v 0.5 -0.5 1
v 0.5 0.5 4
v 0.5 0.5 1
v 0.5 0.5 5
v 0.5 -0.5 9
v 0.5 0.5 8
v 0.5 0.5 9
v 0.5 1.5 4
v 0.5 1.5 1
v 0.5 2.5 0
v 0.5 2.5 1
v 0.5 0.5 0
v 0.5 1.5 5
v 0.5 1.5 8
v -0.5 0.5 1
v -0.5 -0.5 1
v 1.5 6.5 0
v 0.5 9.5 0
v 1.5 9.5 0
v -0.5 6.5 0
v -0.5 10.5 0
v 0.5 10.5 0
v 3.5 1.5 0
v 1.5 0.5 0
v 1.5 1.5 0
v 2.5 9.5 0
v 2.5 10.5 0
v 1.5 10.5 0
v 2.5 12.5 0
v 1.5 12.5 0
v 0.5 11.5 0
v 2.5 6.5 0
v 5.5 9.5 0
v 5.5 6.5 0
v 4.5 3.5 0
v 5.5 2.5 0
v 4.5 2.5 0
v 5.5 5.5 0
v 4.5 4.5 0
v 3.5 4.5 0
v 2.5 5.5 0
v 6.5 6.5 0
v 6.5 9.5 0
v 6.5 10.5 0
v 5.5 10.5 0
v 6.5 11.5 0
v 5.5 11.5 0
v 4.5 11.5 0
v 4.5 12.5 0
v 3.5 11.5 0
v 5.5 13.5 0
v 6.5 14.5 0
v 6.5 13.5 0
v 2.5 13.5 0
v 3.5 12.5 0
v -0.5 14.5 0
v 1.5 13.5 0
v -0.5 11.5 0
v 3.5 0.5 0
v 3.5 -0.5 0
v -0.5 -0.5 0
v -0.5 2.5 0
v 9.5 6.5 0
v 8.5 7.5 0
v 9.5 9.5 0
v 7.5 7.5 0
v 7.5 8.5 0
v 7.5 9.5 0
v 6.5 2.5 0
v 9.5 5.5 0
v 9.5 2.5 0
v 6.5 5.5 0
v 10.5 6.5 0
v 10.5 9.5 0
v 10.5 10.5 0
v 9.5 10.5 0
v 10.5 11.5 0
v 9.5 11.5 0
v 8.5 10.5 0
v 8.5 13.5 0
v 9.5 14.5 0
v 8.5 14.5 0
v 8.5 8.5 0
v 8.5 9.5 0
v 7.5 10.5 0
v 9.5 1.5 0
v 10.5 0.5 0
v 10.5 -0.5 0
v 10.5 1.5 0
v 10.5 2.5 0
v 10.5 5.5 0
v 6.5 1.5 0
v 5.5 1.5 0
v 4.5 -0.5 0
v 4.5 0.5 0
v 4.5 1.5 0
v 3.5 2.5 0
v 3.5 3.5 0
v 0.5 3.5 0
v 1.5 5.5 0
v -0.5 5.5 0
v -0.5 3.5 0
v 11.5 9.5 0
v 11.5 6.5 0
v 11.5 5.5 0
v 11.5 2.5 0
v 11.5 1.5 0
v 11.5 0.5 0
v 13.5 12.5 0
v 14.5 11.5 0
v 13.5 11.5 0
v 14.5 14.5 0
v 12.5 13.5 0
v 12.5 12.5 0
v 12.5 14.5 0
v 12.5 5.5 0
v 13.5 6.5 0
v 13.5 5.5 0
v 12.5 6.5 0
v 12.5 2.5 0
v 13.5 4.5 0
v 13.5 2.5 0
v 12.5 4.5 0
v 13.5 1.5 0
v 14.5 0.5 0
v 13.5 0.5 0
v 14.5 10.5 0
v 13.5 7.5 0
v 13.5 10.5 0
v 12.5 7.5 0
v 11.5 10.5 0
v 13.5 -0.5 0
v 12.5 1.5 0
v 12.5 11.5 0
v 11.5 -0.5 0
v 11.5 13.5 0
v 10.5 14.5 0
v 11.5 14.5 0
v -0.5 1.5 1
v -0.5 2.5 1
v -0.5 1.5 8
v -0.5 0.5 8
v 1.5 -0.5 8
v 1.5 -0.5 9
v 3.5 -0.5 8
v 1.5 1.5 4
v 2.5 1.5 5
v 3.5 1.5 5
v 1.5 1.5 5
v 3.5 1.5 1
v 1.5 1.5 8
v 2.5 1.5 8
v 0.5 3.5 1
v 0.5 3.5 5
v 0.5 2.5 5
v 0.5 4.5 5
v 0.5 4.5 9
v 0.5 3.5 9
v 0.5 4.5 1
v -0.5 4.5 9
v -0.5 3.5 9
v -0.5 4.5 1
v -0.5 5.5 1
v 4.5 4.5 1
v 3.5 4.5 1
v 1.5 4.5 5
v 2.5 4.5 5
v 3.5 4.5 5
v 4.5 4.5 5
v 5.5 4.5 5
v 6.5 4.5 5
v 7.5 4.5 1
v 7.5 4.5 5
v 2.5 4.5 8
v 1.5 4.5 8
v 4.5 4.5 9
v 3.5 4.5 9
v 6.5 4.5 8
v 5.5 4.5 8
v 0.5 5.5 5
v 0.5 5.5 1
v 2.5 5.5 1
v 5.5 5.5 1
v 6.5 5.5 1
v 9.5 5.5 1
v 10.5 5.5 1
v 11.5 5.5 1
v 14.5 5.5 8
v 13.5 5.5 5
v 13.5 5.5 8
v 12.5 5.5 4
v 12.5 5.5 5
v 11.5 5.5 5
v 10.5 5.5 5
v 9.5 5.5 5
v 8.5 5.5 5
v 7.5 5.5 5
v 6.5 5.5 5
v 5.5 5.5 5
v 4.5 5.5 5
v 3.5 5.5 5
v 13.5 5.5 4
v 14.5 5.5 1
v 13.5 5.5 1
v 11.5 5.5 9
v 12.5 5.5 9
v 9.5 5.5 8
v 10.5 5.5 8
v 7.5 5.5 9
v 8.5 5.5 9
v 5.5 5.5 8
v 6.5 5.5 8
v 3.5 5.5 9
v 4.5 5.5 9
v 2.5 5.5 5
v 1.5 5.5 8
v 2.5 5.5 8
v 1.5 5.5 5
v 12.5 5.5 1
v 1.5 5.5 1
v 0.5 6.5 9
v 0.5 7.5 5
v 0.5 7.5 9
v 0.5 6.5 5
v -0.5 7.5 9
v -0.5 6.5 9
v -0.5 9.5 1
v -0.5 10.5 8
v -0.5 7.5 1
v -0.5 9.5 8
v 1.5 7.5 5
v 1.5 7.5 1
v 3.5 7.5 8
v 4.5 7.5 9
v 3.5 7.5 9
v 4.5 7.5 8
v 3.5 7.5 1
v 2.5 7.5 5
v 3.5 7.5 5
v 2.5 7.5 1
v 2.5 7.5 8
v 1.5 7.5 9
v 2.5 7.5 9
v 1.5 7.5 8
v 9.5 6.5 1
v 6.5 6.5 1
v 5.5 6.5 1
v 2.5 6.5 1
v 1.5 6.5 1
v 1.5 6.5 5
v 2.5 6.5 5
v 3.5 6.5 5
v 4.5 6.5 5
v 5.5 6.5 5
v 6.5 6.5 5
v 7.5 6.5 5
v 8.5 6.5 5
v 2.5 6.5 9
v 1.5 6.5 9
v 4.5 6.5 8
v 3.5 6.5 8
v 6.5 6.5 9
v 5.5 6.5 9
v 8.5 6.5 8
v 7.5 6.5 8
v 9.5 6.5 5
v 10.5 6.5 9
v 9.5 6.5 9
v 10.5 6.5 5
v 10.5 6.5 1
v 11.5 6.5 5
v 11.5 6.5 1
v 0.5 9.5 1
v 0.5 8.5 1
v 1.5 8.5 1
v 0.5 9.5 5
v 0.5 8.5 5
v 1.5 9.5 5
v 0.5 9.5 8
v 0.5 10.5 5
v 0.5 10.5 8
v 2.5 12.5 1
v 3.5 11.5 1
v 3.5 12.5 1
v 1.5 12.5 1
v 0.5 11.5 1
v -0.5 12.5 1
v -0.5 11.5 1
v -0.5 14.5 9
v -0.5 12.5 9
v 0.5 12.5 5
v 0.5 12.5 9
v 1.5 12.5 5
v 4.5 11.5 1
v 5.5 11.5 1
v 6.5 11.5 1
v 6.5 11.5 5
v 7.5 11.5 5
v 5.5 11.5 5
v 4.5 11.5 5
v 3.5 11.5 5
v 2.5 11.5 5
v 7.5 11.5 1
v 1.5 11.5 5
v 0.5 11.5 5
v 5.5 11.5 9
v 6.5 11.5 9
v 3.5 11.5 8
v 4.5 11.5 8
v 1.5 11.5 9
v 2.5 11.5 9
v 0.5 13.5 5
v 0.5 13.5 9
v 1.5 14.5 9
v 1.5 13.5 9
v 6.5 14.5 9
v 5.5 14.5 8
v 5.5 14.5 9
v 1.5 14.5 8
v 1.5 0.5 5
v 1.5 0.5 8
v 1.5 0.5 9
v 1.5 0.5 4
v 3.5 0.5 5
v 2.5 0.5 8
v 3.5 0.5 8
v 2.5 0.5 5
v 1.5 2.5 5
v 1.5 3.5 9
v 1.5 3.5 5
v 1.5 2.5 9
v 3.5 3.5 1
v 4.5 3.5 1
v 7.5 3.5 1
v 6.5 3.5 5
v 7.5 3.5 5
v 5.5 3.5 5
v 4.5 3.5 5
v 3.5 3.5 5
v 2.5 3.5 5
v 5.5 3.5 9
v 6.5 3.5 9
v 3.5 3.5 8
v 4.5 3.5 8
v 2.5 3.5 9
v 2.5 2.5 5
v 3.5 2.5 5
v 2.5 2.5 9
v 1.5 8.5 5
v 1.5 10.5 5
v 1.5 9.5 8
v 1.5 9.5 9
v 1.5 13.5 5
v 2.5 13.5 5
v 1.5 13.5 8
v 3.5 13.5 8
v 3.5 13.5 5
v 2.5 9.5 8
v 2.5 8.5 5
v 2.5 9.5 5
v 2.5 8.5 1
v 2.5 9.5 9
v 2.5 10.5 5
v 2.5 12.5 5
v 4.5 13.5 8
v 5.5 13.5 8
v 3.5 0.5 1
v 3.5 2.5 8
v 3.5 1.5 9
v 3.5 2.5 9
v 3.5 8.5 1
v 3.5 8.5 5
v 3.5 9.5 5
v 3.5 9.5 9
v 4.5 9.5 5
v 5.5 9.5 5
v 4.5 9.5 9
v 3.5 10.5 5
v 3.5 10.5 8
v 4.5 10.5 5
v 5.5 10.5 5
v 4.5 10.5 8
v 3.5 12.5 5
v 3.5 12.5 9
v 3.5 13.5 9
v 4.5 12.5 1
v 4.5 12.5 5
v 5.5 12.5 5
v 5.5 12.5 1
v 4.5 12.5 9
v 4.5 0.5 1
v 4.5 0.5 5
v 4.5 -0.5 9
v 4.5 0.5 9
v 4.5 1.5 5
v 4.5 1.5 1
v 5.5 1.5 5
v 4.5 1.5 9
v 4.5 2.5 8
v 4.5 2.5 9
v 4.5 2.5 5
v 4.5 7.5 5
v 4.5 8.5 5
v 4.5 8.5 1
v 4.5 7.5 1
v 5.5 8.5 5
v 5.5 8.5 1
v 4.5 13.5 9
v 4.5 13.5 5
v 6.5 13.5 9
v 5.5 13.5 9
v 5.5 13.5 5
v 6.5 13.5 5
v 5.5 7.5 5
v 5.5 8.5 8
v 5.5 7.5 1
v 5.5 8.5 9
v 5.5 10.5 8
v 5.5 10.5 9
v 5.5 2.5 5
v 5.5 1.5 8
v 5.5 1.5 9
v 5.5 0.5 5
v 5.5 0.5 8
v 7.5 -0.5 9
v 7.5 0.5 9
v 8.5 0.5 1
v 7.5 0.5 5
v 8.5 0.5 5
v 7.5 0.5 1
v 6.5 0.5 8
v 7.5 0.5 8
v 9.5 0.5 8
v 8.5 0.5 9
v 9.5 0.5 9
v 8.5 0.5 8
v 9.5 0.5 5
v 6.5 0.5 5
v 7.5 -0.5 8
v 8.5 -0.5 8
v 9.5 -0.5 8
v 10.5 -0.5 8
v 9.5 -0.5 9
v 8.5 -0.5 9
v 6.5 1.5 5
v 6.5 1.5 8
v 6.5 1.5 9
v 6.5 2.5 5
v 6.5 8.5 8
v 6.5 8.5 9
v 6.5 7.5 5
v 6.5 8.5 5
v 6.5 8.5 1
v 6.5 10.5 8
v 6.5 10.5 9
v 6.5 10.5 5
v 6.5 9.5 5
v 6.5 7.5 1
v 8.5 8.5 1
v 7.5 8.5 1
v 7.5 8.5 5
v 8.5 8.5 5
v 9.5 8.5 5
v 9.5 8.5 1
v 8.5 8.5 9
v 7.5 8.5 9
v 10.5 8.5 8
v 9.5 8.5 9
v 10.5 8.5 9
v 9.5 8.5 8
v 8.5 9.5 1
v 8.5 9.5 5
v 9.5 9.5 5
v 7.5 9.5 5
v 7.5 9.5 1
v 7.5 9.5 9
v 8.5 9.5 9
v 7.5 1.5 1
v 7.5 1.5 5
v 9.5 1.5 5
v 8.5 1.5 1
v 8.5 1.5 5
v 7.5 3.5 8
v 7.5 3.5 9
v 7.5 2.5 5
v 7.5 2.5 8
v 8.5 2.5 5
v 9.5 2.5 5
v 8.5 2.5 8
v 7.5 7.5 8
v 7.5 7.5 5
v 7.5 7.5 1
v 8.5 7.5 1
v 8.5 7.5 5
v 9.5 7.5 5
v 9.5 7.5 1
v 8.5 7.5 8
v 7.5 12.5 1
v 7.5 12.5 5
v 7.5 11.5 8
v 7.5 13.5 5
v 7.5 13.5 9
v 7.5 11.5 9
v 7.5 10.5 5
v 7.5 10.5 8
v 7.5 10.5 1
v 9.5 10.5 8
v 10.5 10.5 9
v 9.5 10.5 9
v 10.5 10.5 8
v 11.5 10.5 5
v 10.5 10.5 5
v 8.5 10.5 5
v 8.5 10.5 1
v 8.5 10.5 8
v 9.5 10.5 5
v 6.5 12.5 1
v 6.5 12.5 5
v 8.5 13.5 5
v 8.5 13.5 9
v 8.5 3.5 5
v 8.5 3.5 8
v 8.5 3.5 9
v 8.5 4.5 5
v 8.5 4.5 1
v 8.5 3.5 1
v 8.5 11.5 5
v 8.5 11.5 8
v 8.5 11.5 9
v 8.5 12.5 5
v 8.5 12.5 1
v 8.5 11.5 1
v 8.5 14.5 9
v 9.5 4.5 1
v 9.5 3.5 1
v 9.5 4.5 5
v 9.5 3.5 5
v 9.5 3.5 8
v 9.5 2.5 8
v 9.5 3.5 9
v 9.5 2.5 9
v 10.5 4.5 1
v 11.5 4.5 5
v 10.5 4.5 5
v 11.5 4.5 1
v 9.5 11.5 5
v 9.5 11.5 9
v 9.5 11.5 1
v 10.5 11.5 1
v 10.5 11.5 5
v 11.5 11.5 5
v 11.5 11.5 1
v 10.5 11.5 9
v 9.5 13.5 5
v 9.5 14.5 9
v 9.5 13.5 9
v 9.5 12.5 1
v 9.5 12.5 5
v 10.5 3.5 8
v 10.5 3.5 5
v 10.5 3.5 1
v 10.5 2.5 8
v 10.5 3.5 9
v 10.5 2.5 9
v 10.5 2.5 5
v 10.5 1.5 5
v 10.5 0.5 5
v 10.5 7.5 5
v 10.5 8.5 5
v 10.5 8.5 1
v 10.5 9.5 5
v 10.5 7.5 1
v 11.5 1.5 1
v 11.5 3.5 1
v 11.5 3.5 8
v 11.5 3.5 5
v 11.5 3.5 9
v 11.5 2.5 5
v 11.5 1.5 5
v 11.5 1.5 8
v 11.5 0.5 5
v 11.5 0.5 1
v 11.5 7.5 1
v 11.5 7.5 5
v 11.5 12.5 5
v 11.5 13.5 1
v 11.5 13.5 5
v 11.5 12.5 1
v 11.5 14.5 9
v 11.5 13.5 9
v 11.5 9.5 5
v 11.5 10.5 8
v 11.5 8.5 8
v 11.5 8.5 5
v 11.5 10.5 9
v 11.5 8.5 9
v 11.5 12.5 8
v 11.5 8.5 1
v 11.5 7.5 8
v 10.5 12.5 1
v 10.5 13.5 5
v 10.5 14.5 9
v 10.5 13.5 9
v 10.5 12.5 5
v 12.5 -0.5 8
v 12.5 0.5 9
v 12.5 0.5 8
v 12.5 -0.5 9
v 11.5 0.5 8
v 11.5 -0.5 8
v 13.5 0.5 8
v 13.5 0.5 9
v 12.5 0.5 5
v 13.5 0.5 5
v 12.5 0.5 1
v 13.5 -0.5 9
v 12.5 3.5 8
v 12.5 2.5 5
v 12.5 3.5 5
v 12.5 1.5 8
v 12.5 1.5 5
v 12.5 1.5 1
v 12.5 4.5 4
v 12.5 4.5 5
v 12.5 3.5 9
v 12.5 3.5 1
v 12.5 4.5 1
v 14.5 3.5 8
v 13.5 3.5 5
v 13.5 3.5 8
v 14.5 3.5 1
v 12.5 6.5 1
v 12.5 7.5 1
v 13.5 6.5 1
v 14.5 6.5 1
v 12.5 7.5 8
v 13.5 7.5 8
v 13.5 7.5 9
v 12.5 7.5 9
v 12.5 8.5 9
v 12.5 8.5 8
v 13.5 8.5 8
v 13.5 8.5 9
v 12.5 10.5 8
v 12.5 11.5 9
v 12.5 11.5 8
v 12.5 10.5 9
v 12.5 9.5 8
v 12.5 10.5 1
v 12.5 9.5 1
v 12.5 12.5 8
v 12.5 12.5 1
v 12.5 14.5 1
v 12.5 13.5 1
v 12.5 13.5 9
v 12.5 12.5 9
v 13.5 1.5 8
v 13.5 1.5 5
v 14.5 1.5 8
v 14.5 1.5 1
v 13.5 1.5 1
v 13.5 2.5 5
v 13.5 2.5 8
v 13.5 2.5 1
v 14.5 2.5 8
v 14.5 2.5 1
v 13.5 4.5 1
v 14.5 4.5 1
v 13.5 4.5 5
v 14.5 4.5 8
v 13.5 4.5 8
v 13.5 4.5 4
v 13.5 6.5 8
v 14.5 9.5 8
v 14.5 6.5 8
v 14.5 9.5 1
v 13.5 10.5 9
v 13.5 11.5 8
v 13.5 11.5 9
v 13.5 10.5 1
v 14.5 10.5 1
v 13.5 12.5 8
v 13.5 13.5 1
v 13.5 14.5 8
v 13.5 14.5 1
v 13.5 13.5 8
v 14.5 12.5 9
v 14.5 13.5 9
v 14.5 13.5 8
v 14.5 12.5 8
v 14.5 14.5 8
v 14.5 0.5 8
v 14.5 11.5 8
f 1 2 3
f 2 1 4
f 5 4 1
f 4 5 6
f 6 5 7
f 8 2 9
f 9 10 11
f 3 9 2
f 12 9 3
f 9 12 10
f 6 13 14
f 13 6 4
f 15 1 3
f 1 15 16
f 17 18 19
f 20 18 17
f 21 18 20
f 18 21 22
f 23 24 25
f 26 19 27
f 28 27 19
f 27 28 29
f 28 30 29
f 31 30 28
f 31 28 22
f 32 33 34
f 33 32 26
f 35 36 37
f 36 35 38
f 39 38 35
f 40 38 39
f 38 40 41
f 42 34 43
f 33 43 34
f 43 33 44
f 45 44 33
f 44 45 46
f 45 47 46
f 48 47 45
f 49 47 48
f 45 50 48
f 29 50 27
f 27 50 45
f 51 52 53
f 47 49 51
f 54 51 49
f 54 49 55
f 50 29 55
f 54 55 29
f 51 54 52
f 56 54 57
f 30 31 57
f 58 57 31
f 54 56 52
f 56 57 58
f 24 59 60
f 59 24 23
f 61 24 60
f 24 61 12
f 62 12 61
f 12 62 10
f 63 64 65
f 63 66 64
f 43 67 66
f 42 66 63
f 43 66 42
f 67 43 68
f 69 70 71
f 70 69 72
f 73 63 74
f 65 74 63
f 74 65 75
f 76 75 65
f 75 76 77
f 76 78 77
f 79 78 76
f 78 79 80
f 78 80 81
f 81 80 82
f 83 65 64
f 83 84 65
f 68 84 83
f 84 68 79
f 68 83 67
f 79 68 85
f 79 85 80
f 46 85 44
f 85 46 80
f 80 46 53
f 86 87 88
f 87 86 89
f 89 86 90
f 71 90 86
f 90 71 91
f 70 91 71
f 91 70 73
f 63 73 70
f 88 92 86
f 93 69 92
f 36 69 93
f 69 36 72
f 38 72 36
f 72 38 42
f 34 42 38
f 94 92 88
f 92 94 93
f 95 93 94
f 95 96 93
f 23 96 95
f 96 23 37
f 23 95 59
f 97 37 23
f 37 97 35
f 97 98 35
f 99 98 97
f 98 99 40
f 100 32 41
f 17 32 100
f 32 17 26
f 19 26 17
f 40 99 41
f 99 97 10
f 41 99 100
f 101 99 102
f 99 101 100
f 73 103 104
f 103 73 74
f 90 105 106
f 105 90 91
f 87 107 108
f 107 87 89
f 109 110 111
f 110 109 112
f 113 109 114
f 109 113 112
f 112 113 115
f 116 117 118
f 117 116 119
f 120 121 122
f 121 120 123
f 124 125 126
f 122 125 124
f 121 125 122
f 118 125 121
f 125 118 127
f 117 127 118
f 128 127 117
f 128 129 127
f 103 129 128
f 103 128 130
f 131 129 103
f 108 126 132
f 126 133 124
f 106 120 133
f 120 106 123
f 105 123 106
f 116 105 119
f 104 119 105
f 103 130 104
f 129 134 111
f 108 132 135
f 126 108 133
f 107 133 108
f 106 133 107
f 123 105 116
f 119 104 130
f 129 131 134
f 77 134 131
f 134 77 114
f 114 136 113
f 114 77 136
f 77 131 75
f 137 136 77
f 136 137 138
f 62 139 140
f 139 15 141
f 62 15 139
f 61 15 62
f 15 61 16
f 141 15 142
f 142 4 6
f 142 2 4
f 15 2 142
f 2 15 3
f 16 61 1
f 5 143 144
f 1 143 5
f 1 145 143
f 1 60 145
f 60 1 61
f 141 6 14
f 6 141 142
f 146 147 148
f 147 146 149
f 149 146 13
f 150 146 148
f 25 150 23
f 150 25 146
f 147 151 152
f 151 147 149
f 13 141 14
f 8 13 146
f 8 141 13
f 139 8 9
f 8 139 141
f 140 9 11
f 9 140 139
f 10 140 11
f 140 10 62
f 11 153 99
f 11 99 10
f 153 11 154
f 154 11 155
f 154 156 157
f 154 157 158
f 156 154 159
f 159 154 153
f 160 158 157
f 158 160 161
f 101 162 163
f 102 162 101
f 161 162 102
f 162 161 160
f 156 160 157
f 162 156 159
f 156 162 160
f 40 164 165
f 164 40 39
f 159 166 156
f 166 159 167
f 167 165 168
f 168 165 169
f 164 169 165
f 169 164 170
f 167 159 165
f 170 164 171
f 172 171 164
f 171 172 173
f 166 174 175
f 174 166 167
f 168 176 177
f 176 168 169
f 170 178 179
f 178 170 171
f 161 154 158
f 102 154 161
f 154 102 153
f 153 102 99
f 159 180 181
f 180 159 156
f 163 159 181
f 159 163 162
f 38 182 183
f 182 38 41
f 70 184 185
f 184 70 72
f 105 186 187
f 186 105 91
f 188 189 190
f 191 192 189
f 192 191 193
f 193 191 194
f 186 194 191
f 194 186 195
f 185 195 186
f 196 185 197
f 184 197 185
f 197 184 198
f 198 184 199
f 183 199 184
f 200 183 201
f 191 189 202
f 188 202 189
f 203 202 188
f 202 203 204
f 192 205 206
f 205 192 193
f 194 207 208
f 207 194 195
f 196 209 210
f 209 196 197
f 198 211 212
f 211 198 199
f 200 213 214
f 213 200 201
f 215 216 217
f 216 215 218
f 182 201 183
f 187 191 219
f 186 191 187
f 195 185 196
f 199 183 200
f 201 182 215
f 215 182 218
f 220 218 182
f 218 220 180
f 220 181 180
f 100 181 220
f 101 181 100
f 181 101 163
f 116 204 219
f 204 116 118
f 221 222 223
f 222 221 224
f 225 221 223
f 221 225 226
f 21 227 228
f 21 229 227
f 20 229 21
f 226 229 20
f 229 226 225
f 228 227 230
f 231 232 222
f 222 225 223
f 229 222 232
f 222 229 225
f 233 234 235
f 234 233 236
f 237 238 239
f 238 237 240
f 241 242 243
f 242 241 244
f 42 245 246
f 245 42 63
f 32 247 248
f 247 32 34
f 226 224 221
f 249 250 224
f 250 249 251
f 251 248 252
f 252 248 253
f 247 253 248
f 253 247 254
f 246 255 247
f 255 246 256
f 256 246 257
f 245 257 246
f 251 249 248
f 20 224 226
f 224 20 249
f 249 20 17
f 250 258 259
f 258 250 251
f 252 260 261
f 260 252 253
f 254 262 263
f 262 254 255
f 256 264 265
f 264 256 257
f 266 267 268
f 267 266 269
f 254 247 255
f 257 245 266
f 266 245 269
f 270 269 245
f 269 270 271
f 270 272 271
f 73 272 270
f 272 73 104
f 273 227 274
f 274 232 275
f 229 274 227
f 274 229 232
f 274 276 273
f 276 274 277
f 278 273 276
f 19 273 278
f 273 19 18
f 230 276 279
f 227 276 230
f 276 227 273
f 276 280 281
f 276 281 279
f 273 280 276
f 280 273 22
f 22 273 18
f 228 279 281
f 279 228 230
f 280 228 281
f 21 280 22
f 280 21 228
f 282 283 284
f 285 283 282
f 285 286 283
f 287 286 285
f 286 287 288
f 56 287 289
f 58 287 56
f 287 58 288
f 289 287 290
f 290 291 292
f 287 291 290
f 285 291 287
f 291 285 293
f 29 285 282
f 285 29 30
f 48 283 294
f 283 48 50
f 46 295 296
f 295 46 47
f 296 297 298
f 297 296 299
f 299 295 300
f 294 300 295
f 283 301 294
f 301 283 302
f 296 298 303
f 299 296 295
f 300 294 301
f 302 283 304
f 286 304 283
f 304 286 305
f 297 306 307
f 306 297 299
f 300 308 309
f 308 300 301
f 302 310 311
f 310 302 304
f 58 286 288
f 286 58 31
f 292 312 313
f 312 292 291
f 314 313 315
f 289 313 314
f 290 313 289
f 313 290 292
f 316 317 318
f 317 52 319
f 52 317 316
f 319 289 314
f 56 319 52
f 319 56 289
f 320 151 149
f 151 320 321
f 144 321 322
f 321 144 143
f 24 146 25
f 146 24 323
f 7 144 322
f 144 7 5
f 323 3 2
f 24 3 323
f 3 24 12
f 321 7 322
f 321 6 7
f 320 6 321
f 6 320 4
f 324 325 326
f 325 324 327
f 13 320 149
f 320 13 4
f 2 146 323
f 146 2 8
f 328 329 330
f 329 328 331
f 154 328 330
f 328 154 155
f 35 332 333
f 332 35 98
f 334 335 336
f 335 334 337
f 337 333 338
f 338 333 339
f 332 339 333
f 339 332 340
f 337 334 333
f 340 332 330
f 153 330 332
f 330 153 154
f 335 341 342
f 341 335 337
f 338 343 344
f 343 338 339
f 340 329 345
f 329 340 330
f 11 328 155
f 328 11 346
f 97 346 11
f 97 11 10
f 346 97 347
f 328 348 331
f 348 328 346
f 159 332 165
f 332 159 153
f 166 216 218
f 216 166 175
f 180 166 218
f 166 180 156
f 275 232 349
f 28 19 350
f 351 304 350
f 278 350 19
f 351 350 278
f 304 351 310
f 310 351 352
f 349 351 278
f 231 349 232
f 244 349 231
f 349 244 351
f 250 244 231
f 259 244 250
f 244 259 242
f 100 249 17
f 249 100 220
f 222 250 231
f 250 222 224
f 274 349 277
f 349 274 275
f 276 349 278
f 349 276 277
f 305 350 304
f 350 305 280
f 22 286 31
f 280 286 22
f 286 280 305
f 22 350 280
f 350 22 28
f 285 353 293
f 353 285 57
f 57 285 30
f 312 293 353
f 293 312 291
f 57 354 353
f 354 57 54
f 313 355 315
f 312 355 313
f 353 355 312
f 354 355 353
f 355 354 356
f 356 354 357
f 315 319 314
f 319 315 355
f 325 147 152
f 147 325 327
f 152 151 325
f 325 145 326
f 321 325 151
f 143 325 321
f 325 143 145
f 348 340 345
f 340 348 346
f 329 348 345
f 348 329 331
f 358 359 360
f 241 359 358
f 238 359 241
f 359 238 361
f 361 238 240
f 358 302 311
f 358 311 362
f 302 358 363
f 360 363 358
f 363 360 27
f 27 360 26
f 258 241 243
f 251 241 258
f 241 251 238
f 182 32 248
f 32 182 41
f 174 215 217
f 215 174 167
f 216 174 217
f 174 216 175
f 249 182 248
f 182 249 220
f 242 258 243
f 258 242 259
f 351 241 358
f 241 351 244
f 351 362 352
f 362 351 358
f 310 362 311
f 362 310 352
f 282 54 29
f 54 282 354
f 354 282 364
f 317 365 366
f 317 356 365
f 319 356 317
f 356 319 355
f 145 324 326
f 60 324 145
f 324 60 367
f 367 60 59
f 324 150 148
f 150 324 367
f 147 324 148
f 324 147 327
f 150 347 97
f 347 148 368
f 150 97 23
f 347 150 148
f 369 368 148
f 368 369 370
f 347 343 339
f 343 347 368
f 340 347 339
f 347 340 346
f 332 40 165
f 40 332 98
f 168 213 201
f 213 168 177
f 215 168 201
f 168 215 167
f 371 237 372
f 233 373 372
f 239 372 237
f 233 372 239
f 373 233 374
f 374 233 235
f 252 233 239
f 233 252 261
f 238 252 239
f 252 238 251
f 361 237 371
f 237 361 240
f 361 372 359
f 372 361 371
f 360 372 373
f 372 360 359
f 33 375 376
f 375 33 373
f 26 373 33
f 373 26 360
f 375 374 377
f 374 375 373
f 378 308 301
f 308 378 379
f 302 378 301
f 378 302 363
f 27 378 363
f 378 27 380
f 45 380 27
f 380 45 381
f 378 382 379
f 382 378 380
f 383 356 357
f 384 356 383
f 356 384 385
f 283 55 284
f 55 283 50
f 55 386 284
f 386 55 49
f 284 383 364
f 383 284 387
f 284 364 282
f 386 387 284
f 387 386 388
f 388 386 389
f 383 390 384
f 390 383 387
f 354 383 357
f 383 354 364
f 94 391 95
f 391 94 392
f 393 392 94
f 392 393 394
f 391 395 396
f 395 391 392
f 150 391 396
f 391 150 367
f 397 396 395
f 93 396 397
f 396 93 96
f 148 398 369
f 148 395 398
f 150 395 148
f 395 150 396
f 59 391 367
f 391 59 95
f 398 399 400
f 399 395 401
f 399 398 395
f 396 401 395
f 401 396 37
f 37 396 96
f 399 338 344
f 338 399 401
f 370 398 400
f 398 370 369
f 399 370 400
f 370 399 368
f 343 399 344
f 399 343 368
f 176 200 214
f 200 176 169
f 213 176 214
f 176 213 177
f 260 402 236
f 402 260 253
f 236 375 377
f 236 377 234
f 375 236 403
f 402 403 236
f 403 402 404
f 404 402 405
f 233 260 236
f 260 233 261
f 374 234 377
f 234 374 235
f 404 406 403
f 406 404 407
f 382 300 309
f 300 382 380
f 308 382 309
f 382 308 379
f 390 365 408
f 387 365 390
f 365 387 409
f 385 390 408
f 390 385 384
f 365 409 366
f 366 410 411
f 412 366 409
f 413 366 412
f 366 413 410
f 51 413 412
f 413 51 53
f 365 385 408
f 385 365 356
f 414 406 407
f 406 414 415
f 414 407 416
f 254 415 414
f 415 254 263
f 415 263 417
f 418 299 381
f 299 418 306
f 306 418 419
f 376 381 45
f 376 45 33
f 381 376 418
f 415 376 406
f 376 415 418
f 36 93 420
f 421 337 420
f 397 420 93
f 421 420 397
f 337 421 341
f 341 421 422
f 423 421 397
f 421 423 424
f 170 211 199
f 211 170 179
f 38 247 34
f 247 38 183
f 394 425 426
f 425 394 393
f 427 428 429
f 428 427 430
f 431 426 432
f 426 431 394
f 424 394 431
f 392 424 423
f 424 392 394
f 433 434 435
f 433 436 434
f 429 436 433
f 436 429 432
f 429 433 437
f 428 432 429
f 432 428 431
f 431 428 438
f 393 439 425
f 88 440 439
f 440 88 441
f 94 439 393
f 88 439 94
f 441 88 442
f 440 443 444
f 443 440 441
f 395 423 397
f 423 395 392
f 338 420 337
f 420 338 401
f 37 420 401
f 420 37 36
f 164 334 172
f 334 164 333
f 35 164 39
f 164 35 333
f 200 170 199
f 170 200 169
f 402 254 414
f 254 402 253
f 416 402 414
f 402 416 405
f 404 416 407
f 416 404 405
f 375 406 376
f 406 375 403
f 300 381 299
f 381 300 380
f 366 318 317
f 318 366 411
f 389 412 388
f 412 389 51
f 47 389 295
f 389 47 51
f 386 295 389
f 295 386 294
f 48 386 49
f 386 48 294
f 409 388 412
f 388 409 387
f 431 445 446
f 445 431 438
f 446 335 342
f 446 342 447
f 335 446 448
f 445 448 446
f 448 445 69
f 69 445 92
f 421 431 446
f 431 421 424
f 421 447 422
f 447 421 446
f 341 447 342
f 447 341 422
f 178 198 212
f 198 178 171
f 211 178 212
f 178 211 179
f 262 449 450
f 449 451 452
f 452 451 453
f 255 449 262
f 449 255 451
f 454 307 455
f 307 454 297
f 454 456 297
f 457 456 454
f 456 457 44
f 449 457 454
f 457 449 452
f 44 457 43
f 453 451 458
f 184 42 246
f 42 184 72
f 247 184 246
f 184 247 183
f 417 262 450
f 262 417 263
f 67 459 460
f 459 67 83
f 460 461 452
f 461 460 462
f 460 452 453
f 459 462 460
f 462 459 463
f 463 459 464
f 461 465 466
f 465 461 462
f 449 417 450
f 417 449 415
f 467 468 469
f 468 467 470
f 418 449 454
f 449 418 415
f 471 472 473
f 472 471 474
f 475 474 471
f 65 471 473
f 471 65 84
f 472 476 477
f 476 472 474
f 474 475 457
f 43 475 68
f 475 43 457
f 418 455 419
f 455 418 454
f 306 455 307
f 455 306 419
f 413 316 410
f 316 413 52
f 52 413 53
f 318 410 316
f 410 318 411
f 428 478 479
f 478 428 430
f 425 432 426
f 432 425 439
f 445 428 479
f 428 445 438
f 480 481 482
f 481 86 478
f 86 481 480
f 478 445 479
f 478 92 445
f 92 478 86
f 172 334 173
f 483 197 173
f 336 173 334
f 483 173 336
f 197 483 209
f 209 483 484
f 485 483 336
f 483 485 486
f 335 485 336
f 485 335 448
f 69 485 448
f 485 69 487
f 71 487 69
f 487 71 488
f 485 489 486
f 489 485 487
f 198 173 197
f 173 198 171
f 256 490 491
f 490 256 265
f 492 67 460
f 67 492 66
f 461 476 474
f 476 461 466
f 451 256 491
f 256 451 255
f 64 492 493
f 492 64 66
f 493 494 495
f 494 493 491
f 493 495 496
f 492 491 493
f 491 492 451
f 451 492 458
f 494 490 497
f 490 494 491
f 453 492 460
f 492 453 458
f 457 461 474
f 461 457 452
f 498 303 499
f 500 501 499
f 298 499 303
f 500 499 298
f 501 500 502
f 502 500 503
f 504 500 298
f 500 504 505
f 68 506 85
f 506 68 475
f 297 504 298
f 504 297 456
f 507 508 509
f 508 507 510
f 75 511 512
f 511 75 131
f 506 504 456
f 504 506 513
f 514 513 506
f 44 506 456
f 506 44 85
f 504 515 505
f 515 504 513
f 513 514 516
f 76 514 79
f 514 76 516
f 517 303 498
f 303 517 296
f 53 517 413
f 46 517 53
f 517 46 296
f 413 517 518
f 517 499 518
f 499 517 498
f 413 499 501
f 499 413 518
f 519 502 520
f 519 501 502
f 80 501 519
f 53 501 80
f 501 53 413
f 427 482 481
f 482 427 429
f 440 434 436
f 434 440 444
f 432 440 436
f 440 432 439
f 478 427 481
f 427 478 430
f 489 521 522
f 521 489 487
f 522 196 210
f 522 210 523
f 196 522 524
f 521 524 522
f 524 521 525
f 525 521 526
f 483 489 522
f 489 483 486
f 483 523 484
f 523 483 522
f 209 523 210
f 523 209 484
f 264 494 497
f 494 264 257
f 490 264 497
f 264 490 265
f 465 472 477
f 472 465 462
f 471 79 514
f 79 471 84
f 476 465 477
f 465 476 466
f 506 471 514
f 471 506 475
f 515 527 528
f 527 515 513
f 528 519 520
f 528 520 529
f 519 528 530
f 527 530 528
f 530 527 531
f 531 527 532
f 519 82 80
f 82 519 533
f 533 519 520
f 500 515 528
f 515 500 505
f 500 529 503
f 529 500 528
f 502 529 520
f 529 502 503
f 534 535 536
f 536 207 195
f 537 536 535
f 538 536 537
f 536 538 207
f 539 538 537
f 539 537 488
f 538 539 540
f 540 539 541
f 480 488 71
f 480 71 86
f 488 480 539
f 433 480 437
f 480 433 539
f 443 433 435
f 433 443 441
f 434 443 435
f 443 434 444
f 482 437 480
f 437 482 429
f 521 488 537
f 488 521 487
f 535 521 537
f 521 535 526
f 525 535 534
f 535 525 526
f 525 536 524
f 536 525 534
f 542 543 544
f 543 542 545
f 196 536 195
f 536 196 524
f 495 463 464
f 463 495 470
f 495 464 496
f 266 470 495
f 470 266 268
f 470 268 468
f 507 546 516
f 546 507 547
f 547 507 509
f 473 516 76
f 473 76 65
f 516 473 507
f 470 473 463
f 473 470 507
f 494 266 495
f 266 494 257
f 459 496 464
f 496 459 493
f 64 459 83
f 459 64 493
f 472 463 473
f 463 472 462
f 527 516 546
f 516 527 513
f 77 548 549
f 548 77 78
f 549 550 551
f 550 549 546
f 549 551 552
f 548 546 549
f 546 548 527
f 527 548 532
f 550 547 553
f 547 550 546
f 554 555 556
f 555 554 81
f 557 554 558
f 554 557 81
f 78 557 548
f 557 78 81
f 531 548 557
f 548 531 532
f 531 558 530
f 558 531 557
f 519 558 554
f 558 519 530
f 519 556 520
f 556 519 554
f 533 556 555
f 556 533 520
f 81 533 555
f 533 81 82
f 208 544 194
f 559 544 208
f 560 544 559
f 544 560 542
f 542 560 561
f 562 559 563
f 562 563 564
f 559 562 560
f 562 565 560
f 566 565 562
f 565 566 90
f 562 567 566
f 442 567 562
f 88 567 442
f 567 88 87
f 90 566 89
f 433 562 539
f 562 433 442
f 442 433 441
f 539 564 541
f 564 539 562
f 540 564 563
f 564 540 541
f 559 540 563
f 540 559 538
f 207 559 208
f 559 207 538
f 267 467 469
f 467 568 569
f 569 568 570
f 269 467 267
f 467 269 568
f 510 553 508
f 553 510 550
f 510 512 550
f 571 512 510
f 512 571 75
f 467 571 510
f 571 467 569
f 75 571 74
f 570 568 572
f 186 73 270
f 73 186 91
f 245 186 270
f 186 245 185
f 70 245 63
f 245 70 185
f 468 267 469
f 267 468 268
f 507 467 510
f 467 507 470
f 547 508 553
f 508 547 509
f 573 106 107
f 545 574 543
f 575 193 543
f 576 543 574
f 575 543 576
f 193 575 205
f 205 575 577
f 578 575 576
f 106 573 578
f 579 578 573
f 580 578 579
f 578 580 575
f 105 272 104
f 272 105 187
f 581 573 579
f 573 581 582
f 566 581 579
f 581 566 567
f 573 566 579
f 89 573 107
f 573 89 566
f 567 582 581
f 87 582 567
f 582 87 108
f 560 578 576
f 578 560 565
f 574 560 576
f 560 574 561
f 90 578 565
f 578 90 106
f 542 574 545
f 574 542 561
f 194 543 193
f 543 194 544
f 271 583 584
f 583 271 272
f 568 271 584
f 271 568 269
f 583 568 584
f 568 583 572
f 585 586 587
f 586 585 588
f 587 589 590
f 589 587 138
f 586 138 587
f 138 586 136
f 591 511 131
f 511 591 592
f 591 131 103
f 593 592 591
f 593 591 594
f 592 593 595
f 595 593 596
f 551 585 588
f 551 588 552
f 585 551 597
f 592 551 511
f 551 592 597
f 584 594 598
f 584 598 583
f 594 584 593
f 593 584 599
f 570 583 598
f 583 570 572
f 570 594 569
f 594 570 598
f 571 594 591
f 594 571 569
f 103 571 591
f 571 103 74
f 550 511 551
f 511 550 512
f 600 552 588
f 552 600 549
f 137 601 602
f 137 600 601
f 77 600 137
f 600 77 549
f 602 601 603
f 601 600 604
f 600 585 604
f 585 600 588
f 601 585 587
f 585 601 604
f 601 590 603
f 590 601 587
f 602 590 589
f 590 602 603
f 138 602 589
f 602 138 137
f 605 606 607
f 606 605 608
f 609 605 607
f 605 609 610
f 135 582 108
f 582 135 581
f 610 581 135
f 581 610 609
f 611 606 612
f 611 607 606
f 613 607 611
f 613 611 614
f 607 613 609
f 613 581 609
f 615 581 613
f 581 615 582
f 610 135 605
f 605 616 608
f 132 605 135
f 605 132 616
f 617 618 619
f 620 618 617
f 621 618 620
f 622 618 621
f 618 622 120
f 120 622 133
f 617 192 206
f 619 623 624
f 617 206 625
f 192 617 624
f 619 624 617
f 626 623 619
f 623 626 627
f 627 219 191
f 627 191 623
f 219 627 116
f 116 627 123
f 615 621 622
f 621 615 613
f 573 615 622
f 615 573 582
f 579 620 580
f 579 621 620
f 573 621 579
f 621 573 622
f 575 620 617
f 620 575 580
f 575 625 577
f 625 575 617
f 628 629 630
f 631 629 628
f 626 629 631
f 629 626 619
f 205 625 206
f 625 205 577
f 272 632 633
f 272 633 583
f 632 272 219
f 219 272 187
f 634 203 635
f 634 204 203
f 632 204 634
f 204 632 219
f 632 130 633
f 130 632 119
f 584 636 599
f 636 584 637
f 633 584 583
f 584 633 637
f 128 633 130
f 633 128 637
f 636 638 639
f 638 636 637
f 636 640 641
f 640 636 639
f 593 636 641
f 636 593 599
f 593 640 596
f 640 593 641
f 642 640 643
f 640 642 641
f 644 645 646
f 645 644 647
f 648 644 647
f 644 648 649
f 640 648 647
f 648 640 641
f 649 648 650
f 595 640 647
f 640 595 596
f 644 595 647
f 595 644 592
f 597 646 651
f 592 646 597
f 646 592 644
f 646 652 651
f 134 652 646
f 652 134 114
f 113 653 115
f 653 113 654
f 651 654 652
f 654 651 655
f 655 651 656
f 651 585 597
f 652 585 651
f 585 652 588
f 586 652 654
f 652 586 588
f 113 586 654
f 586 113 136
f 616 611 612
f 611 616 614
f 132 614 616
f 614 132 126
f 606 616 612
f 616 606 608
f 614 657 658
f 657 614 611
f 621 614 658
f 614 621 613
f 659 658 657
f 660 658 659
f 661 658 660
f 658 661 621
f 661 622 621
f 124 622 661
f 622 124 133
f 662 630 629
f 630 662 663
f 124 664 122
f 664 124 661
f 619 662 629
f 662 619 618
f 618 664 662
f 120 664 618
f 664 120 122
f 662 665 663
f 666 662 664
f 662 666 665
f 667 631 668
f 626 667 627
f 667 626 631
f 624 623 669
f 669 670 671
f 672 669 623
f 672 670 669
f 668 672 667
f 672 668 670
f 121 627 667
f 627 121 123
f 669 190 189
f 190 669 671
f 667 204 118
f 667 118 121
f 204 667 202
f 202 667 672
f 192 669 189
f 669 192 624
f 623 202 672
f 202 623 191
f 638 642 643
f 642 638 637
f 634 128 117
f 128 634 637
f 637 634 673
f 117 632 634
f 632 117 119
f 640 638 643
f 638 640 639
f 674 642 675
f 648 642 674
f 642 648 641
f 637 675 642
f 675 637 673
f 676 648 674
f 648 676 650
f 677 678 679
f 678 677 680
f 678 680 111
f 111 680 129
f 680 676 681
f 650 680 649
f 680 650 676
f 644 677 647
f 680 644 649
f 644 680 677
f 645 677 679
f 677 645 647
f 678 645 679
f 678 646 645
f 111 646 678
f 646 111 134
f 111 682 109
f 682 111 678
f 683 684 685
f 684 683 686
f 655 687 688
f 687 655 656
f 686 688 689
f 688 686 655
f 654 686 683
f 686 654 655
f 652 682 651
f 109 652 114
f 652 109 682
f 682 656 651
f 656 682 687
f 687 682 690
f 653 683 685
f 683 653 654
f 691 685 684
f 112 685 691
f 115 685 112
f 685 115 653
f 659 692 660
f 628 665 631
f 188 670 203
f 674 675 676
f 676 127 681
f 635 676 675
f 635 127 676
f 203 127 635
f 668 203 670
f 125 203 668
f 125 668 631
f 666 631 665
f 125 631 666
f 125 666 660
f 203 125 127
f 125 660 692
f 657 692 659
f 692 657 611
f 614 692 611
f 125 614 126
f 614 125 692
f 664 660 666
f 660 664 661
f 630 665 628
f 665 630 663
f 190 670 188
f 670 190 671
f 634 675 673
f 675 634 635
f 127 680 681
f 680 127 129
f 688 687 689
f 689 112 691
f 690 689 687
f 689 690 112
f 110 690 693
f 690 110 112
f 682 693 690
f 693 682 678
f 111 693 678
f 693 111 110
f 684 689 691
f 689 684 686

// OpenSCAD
union() {
    translate([0, 0, 0.5]) cube([1, 1, 1], center=true);
    translate([0, 1, 4.0]) cube([1, 1, 8], center=true);
    translate([0, 2, 0.5]) cube([1, 1, 1], center=true);
    translate([0, 4, 4.5]) cube([1, 1, 9], center=true);
    translate([0, 5, 0.5]) cube([1, 1, 1], center=true);
    translate([0, 7, 4.5]) cube([1, 1, 9], center=true);
    translate([0, 8, 0.5]) cube([1, 1, 1], center=true);
    translate([0, 9, 0.5]) cube([1, 1, 1], center=true);
    translate([0, 10, 4.0]) cube([1, 1, 8], center=true);
    translate([0, 12, 0.5]) cube([1, 1, 1], center=true);
    translate([0, 13, 4.5]) cube([1, 1, 9], center=true);
    translate([0, 14, 4.5]) cube([1, 1, 9], center=true);
    translate([1, 0, 4.5]) cube([1, 1, 9], center=true);
    translate([1, 1, 4.5]) color([1, 0, 0]) cube([1, 1, 1], center=true);
    translate([1, 3, 2.5]) cube([1, 1, 5], center=true);
    translate([1, 4, 0.5]) cube([1, 1, 1], center=true);
    translate([1, 5, 2.5]) cube([1, 1, 5], center=true);
    translate([1, 7, 2.5]) cube([1, 1, 5], center=true);
    translate([1, 8, 0.5]) cube([1, 1, 1], center=true);
    translate([1, 9, 2.5]) cube([1, 1, 5], center=true);
    translate([1, 11, 2.5]) cube([1, 1, 5], center=true);
    translate([1, 12, 0.5]) cube([1, 1, 1], center=true);
    translate([1, 13, 2.5]) cube([1, 1, 5], center=true);
    translate([1, 14, 4.5]) cube([1, 1, 9], center=true);
    translate([2, 0, 4.0]) cube([1, 1, 8], center=true);
    translate([2, 1, 4.0]) cube([1, 1, 8], center=true);
    translate([2, 3, 4.5]) cube([1, 1, 9], center=true);
    translate([2, 4, 0.5]) cube([1, 1, 1], center=true);
    translate([2, 5, 4.0]) cube([1, 1, 8], center=true);
    translate([2, 6, 0.5]) cube([1, 1, 1], center=true);
    translate([2, 7, 4.5]) cube([1, 1, 9], center=true);
    translate([2, 8, 4.0]) cube([1, 1, 8], center=true);
    translate([2, 9, 4.0]) cube([1, 1, 8], center=true);
    translate([2, 10, 4.5]) cube([1, 1, 9], center=true);
    translate([2, 11, 4.5]) cube([1, 1, 9], center=true);
    translate([2, 12, 0.5]) cube([1, 1, 1], center=true);
    translate([2, 14, 4.0]) cube([1, 1, 8], center=true);
    translate([3, 0, 4.0]) cube([1, 1, 8], center=true);
    translate([3, 1, 2.5]) cube([1, 1, 5], center=true);
    translate([3, 3, 2.5]) cube([1, 1, 5], center=true);
    translate([3, 4, 0.5]) cube([1, 1, 1], center=true);
    translate([3, 5, 2.5]) cube([1, 1, 5], center=true);
    translate([3, 7, 2.5]) cube([1, 1, 5], center=true);
    translate([3, 8, 0.5]) cube([1, 1, 1], center=true);
    translate([3, 9, 2.5]) cube([1, 1, 5], center=true);
    translate([3, 11, 2.5]) cube([1, 1, 5], center=true);
    translate([3, 12, 0.5]) cube([1, 1, 1], center=true);
    translate([3, 13, 2.5]) cube([1, 1, 5], center=true);
    translate([3, 14, 4.0]) cube([1, 1, 8], center=true);
    translate([4, 1, 0.5]) cube([1, 1, 1], center=true);
    translate([4, 2, 4.5]) cube([1, 1, 9], center=true);
    translate([4, 3, 4.0]) cube([1, 1, 8], center=true);
    translate([4, 5, 4.5]) cube([1, 1, 9], center=true);
    translate([4, 7, 4.0]) cube([1, 1, 8], center=true);
    translate([4, 8, 4.5]) cube([1, 1, 9], center=true);
    translate([4, 9, 4.5]) cube([1, 1, 9], center=true);
    translate([4, 11, 4.0]) cube([1, 1, 8], center=true);
    translate([4, 13, 4.5]) cube([1, 1, 9], center=true);
    translate([4, 14, 4.0]) cube([1, 1, 8], center=true);
    translate([5, 0, 4.5]) cube([1, 1, 9], center=true);
    translate([5, 1, 2.5]) cube([1, 1, 5], center=true);
    translate([5, 3, 2.5]) cube([1, 1, 5], center=true);
    translate([5, 4, 0.5]) cube([1, 1, 1], center=true);
    translate([5, 5, 2.5]) cube([1, 1, 5], center=true);
    translate([5, 7, 2.5]) cube([1, 1, 5], center=true);
    translate([5, 8, 0.5]) cube([1, 1, 1], center=true);
    translate([5, 9, 2.5]) cube([1, 1, 5], center=true);
    translate([5, 11, 2.5]) cube([1, 1, 5], center=true);
    translate([5, 12, 0.5]) cube([1, 1, 1], center=true);
    translate([5, 13, 2.5]) cube([1, 1, 5], center=true);
    translate([5, 14, 4.0]) cube([1, 1, 8], center=true);
    translate([6, 0, 4.5]) cube([1, 1, 9], center=true);
    translate([6, 1, 4.0]) cube([1, 1, 8], center=true);
    translate([6, 2, 4.5]) cube([1, 1, 9], center=true);
    translate([6, 3, 4.5]) cube([1, 1, 9], center=true);
    translate([6, 4, 0.5]) cube([1, 1, 1], center=true);
    translate([6, 5, 4.0]) cube([1, 1, 8], center=true);
    translate([6, 6, 0.5]) cube([1, 1, 1], center=true);
    translate([6, 7, 4.5]) cube([1, 1, 9], center=true);
    translate([6, 8, 4.5]) cube([1, 1, 9], center=true);
    translate([6, 9, 4.0]) cube([1, 1, 8], center=true);
    translate([6, 10, 4.0]) cube([1, 1, 8], center=true);
    translate([6, 11, 4.5]) cube([1, 1, 9], center=true);
    translate([6, 14, 4.5]) cube([1, 1, 9], center=true);
    translate([7, 0, 4.5]) cube([1, 1, 9], center=true);
    translate([7, 1, 2.5]) cube([1, 1, 5], center=true);
    translate([7, 3, 2.5]) cube([1, 1, 5], center=true);
    translate([7, 4, 0.5]) cube([1, 1, 1], center=true);
    translate([7, 5, 2.5]) cube([1, 1, 5], center=true);
    translate([7, 7, 2.5]) cube([1, 1, 5], center=true);
    translate([7, 8, 0.5]) cube([1, 1, 1], center=true);
    translate([7, 9, 2.5]) cube([1, 1, 5], center=true);
    translate([7, 11, 2.5]) cube([1, 1, 5], center=true);
    translate([7, 12, 0.5]) cube([1, 1, 1], center=true);
    translate([7, 13, 2.5]) cube([1, 1, 5], center=true);
    translate([8, 0, 4.0]) cube([1, 1, 8], center=true);
    translate([8, 1, 0.5]) cube([1, 1, 1], center=true);
    translate([8, 3, 4.0]) cube([1, 1, 8], center=true);
    translate([8, 4, 4.5]) cube([1, 1, 9], center=true);
    translate([8, 5, 4.5]) cube([1, 1, 9], center=true);
    translate([8, 7, 4.0]) cube([1, 1, 8], center=true);
    translate([8, 9, 4.5]) cube([1, 1, 9], center=true);
    translate([8, 10, 0.5]) cube([1, 1, 1], center=true);
    translate([8, 11, 4.0]) cube([1, 1, 8], center=true);
    translate([8, 12, 4.5]) cube([1, 1, 9], center=true);
    translate([8, 13, 4.5]) cube([1, 1, 9], center=true);
    translate([9, 0, 4.5]) cube([1, 1, 9], center=true);
    translate([9, 1, 2.5]) cube([1, 1, 5], center=true);
    translate([9, 3, 2.5]) cube([1, 1, 5], center=true);
    translate([9, 4, 0.5]) cube([1, 1, 1], center=true);
    translate([9, 5, 2.5]) cube([1, 1, 5], center=true);
    translate([9, 7, 2.5]) cube([1, 1, 5], center=true);
    translate([9, 8, 0.5]) cube([1, 1, 1], center=true);
    translate([9, 9, 2.5]) cube([1, 1, 5], center=true);
    translate([9, 11, 2.5]) cube([1, 1, 5], center=true);
    translate([9, 12, 0.5]) cube([1, 1, 1], center=true);
    translate([9, 13, 2.5]) cube([1, 1, 5], center=true);
    translate([9, 14, 4.5]) cube([1, 1, 9], center=true);
    translate([10, 0, 4.0]) cube([1, 1, 8], center=true);
    translate([10, 1, 4.0]) cube([1, 1, 8], center=true);
    translate([10, 2, 4.0]) cube([1, 1, 8], center=true);
    translate([10, 3, 4.5]) cube([1, 1, 9], center=true);
    translate([10, 4, 4.0]) cube([1, 1, 8], center=true);
    translate([10, 5, 4.0]) cube([1, 1, 8], center=true);
    translate([10, 6, 0.5]) cube([1, 1, 1], center=true);
    translate([10, 7, 4.5]) cube([1, 1, 9], center=true);
    translate([10, 8, 4.5]) cube([1, 1, 9], center=true);
    translate([10, 9, 4.0]) cube([1, 1, 8], center=true);
    translate([10, 10, 4.0]) cube([1, 1, 8], center=true);
    translate([10, 11, 4.5]) cube([1, 1, 9], center=true);
    translate([11, 1, 2.5]) cube([1, 1, 5], center=true);
    translate([11, 3, 2.5]) cube([1, 1, 5], center=true);
    translate([11, 4, 0.5]) cube([1, 1, 1], center=true);
    translate([11, 5, 2.5]) cube([1, 1, 5], center=true);
    translate([11, 7, 2.5]) cube([1, 1, 5], center=true);
    translate([11, 8, 0.5]) cube([1, 1, 1], center=true);
    translate([11, 9, 2.5]) cube([1, 1, 5], center=true);
    translate([11, 11, 2.5]) cube([1, 1, 5], center=true);
    translate([11, 12, 0.5]) cube([1, 1, 1], center=true);
    translate([11, 13, 2.5]) cube([1, 1, 5], center=true);
    translate([11, 14, 4.5]) cube([1, 1, 9], center=true);
    translate([12, 0, 4.0]) cube([1, 1, 8], center=true);
    translate([12, 1, 0.5]) cube([1, 1, 1], center=true);
    translate([12, 2, 4.0]) cube([1, 1, 8], center=true);
    translate([12, 3, 4.0]) cube([1, 1, 8], center=true);
    translate([12, 4, 4.5]) cube([1, 1, 9], center=true);
    translate([12, 5, 4.5]) cube([1, 1, 9], center=true);
    translate([12, 6, 0.5]) cube([1, 1, 1], center=true);
    translate([12, 7, 0.5]) cube([1, 1, 1], center=true);
    translate([12, 8, 4.0]) cube([1, 1, 8], center=true);
    translate([12, 9, 4.5]) cube([1, 1, 9], center=true);
    translate([12, 10, 4.5]) cube([1, 1, 9], center=true);
    translate([12, 11, 4.0]) cube([1, 1, 8], center=true);
    translate([12, 12, 4.0]) cube([1, 1, 8], center=true);
    translate([12, 13, 0.5]) cube([1, 1, 1], center=true);
    translate([13, 0, 4.5]) cube([1, 1, 9], center=true);
    translate([13, 1, 2.5]) cube([1, 1, 5], center=true);
    translate([13, 3, 2.5]) cube([1, 1, 5], center=true);
    translate([13, 4, 0.5]) cube([1, 1, 1], center=true);
    translate([13, 5, 4.5]) color([0, 0, 1]) cube([1, 1, 1], center=true);
    translate([13, 6, 0.5]) cube([1, 1, 1], center=true);
    translate([13, 8, 4.5]) cube([1, 1, 9], center=true);
    translate([13, 9, 4.0]) cube([1, 1, 8], center=true);
    translate([13, 10, 0.5]) cube([1, 1, 1], center=true);
    translate([13, 11, 4.5]) cube([1, 1, 9], center=true);
    translate([13, 13, 4.5]) cube([1, 1, 9], center=true);
    translate([13, 14, 0.5]) cube([1, 1, 1], center=true);
    translate([14, 1, 4.0]) cube([1, 1, 8], center=true);
    translate([14, 2, 0.5]) cube([1, 1, 1], center=true);
    translate([14, 3, 4.0]) cube([1, 1, 8], center=true);
    translate([14, 4, 0.5]) cube([1, 1, 1], center=true);
    translate([14, 5, 4.0]) cube([1, 1, 8], center=true);
    translate([14, 6, 0.5]) cube([1, 1, 1], center=true);
    translate([14, 7, 4.0]) cube([1, 1, 8], center=true);
    translate([14, 8, 4.0]) cube([1, 1, 8], center=true);
    translate([14, 9, 4.0]) cube([1, 1, 8], center=true);
    translate([14, 10, 0.5]) cube([1, 1, 1], center=true);
    translate([14, 12, 4.0]) cube([1, 1, 8], center=true);
    translate([14, 13, 4.5]) cube([1, 1, 9], center=true);
    translate([14, 14, 4.0]) cube([1, 1, 8], center=true);
}
